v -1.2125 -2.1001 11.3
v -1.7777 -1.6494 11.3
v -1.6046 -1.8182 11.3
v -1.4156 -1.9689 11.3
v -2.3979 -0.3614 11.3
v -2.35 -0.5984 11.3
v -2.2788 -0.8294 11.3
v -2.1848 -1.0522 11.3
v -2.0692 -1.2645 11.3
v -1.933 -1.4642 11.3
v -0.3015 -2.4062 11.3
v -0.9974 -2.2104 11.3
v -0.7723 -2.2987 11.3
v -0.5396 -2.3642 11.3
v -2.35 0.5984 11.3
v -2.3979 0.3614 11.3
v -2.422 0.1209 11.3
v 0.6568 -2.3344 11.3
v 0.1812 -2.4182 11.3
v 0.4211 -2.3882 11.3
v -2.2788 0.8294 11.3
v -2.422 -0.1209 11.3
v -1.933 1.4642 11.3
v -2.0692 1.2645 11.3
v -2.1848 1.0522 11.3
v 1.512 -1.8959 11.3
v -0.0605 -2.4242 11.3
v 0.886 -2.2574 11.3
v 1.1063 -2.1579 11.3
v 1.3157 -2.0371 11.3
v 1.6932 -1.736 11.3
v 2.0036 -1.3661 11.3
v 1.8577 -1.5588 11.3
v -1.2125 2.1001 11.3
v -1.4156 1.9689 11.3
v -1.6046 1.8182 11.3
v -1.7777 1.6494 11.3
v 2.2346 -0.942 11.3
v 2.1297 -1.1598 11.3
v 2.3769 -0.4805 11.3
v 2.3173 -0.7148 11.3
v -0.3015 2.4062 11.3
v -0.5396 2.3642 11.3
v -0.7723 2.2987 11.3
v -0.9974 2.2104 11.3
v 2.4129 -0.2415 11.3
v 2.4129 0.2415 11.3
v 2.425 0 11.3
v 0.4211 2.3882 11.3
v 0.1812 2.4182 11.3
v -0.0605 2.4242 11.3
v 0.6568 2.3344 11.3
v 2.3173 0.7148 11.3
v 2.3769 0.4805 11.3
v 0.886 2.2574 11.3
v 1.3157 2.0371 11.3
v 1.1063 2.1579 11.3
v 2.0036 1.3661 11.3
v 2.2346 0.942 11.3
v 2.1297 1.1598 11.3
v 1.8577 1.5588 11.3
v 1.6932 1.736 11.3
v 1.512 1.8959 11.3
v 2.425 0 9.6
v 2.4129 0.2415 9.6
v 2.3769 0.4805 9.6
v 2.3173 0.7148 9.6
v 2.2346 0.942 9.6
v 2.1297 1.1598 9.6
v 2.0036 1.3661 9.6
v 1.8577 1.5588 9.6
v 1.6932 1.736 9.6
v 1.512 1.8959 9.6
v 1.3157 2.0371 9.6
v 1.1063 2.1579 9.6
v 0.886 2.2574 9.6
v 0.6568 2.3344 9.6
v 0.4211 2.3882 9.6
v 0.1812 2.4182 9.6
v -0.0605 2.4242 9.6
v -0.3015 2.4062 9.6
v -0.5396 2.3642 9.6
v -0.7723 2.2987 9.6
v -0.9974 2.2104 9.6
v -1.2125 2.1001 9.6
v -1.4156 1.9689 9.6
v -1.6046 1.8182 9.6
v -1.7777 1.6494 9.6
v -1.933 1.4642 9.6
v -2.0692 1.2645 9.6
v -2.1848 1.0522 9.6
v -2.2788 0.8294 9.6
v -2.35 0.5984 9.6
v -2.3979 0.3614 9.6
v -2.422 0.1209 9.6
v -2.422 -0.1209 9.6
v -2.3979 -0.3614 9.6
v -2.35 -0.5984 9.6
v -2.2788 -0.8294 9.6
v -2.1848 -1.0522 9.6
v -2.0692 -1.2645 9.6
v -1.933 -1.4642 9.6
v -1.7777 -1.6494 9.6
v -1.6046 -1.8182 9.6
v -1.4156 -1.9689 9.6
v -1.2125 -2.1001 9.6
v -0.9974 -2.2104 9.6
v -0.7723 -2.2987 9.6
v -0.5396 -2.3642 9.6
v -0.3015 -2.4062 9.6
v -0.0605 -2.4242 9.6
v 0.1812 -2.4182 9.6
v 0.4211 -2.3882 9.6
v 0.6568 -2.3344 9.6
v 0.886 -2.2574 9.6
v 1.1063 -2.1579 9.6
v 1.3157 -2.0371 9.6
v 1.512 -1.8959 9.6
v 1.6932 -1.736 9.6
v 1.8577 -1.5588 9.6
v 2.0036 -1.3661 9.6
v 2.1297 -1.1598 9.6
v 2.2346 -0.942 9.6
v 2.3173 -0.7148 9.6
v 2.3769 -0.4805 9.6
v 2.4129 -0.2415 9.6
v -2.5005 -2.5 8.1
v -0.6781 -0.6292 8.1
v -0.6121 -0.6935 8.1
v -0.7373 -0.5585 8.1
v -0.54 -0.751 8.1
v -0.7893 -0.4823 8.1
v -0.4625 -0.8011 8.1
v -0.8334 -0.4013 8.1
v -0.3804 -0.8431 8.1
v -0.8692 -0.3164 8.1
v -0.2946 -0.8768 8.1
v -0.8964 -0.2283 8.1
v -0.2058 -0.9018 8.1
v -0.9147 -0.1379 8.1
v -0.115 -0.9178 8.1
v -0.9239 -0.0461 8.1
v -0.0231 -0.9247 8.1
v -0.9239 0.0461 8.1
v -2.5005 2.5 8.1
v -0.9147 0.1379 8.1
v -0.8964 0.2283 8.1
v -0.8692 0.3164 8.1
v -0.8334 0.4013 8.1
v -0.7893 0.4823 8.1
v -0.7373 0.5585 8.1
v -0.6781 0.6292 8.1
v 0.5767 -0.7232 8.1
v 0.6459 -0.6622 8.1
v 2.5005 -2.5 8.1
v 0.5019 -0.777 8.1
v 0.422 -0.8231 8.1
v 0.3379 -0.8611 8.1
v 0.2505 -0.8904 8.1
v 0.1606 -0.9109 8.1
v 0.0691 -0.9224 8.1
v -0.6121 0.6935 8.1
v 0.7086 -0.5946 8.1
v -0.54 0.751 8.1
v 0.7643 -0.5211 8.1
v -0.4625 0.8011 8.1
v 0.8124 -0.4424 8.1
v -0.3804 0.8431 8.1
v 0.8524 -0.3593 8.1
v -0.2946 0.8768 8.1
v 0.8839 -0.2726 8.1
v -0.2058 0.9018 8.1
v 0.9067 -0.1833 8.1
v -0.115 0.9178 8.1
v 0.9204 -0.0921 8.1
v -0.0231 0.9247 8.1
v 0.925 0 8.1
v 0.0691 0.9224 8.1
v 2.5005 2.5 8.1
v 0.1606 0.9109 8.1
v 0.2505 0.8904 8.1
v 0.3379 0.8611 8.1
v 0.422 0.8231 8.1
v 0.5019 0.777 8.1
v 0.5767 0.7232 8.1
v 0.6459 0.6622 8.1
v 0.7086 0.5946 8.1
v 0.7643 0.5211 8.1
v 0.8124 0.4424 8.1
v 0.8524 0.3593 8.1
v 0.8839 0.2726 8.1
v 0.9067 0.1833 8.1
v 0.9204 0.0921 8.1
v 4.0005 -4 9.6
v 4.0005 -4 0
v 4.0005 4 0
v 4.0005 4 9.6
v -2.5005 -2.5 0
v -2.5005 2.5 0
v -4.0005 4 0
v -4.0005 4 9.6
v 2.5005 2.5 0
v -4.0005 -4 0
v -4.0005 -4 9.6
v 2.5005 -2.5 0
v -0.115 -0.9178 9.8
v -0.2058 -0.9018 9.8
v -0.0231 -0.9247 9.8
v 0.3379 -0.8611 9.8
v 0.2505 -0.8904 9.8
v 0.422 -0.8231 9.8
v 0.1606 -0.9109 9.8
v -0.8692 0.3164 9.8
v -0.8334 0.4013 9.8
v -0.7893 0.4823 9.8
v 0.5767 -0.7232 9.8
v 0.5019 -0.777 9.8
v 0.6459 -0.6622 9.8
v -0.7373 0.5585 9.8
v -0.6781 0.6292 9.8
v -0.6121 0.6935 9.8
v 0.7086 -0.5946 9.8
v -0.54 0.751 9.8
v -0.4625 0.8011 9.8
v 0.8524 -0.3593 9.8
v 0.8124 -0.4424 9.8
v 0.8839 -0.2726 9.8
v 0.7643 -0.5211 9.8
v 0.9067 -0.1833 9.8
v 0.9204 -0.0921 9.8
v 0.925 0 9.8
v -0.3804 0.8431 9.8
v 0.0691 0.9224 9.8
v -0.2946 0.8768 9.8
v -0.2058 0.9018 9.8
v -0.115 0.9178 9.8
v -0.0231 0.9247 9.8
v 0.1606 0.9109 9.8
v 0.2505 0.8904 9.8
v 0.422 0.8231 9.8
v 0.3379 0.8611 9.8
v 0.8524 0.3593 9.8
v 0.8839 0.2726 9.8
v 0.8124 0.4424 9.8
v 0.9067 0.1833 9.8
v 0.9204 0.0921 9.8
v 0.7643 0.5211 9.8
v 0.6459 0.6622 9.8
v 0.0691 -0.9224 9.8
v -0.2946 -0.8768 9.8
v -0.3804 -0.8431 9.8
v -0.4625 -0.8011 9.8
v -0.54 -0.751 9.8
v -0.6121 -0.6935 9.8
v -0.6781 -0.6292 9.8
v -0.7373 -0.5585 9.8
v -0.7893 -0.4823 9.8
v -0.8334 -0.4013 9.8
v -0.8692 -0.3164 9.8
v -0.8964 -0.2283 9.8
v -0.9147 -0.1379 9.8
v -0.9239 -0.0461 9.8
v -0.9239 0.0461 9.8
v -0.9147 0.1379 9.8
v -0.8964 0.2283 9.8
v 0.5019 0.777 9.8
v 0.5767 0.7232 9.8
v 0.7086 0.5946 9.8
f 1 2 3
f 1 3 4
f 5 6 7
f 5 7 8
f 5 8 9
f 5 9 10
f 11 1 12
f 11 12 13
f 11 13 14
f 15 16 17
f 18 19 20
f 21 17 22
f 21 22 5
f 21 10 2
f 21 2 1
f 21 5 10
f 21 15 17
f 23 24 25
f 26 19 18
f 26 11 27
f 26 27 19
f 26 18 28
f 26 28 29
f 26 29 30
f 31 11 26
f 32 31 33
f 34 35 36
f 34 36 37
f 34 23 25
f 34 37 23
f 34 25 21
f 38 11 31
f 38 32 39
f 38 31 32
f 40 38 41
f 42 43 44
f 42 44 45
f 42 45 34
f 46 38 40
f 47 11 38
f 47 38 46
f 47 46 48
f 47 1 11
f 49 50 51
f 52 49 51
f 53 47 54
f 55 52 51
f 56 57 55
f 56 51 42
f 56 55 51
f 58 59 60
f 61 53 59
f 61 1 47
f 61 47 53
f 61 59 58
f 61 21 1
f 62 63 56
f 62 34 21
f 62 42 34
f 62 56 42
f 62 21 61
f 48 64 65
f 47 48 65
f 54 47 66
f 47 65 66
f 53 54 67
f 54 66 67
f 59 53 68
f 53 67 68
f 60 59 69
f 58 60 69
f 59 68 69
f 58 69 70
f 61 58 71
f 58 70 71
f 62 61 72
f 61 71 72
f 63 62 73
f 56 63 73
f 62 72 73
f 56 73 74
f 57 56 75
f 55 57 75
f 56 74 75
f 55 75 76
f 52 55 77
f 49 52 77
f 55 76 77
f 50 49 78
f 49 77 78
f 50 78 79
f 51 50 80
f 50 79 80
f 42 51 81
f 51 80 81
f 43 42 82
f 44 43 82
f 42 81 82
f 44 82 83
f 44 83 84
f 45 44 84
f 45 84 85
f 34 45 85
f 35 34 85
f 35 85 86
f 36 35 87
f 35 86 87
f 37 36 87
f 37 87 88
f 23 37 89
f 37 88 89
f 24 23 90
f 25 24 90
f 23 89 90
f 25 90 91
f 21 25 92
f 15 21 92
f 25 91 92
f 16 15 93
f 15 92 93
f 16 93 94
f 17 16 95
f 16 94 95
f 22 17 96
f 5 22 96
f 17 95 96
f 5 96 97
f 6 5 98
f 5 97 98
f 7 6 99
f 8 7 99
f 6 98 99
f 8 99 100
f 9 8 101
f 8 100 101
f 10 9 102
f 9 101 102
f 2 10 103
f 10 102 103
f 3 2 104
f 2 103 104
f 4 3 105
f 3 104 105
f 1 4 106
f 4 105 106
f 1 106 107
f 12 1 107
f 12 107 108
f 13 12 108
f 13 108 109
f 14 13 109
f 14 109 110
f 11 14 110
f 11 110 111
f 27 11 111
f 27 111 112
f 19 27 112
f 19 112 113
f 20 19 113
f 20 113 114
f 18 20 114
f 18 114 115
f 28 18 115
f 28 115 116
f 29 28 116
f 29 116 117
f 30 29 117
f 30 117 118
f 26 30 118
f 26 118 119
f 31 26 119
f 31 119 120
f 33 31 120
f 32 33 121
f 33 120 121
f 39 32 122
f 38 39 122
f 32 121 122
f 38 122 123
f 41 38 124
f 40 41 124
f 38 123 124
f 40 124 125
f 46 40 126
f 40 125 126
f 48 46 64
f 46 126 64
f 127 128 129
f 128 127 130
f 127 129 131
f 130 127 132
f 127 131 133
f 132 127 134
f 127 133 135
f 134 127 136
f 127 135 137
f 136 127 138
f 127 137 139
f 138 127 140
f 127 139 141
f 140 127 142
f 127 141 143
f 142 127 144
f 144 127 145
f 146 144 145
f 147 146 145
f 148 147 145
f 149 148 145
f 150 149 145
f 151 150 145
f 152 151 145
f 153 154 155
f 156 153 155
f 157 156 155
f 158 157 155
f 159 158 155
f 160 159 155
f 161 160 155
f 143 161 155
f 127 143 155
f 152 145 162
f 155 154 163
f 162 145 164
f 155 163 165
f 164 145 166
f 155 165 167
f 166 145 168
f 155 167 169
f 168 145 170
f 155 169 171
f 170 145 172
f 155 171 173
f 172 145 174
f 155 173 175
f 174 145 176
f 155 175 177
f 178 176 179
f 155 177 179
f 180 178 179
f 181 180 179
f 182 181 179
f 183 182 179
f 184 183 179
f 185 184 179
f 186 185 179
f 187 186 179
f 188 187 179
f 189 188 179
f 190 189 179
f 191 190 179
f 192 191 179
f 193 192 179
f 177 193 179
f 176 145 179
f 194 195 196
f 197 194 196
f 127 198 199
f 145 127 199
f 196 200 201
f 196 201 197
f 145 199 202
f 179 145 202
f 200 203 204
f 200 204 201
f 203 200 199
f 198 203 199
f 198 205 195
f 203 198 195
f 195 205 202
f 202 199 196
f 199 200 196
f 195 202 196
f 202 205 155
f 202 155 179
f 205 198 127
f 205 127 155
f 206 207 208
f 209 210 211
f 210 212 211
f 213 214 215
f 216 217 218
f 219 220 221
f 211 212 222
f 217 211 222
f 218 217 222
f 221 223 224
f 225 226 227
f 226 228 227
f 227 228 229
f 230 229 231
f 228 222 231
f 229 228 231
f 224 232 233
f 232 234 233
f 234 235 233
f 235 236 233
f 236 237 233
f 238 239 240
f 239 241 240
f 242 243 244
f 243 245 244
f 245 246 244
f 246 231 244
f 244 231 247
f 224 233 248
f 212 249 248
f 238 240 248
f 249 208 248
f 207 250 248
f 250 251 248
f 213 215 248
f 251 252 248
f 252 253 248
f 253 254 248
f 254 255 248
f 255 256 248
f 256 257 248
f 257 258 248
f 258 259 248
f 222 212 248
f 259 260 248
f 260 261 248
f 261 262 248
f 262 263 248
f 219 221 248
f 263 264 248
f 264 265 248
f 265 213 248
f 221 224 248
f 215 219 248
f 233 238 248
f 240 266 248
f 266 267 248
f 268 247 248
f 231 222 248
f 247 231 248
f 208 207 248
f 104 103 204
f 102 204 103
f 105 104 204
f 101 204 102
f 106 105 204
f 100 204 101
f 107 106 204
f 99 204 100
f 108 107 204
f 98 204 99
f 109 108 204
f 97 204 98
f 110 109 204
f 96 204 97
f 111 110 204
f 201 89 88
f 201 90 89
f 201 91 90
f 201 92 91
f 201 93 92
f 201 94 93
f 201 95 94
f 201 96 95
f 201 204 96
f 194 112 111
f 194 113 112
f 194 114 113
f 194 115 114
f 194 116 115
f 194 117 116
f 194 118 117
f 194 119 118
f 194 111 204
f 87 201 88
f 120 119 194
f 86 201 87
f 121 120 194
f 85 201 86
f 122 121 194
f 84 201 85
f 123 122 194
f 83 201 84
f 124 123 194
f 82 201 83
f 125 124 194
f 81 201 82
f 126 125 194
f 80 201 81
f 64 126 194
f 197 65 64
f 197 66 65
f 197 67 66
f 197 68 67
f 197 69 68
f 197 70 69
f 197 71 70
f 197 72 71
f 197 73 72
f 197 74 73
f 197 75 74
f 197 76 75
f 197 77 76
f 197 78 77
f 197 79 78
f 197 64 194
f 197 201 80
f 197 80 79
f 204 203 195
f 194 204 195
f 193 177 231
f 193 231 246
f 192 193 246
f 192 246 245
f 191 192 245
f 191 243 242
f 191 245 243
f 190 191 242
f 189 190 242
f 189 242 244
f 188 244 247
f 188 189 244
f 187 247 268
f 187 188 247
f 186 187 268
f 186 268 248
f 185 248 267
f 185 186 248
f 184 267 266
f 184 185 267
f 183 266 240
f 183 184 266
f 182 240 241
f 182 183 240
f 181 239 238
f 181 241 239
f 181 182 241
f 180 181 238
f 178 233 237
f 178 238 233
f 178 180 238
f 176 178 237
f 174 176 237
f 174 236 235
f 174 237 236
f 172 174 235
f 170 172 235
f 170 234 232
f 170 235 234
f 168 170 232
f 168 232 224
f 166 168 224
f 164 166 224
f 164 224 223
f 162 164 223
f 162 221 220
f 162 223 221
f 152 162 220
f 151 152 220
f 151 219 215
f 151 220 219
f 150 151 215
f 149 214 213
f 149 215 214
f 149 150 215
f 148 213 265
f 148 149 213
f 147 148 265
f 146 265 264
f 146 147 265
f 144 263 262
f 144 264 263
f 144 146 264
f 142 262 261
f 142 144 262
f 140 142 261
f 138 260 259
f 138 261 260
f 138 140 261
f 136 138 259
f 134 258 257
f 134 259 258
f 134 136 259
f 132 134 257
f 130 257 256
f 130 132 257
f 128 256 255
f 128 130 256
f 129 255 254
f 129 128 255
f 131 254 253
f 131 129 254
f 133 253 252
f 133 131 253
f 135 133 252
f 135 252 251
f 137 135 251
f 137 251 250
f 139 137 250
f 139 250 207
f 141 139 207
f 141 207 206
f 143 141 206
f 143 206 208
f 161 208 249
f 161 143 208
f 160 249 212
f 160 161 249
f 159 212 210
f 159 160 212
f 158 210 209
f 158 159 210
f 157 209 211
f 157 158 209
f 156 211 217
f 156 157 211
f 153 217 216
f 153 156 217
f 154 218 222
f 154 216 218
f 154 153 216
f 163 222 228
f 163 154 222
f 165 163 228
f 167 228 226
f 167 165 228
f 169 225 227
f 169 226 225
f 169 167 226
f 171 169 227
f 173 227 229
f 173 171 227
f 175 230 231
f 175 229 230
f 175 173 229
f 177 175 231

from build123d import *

# Parameters (mm, degrees)
F0_W     = 8.001
F0_H     = 8
F1_DEPTH = 9.6
F2_R     = 2.425
F3_DEPTH = 1.7
F4_T     = -1.5


with BuildPart() as f1:
    # F0 (on Top) → F1 (new body)
    with BuildSketch(Plane.XY):
        Rectangle(F0_W, F0_H)
    extrude(amount=F1_DEPTH)

    # F2 (on face) → F3 (join)
    with BuildSketch(Plane.XY.offset(9.6)):
        Circle(F2_R)
    extrude(amount=F3_DEPTH)

    # F4
    f4_openings = [f1.faces().sort_by_distance(p)[0] for p in [
        (0, 0, 0),
    ]]
    offset(amount=F4_T, openings=f4_openings, kind=Kind.INTERSECTION)


solid = f1.part
